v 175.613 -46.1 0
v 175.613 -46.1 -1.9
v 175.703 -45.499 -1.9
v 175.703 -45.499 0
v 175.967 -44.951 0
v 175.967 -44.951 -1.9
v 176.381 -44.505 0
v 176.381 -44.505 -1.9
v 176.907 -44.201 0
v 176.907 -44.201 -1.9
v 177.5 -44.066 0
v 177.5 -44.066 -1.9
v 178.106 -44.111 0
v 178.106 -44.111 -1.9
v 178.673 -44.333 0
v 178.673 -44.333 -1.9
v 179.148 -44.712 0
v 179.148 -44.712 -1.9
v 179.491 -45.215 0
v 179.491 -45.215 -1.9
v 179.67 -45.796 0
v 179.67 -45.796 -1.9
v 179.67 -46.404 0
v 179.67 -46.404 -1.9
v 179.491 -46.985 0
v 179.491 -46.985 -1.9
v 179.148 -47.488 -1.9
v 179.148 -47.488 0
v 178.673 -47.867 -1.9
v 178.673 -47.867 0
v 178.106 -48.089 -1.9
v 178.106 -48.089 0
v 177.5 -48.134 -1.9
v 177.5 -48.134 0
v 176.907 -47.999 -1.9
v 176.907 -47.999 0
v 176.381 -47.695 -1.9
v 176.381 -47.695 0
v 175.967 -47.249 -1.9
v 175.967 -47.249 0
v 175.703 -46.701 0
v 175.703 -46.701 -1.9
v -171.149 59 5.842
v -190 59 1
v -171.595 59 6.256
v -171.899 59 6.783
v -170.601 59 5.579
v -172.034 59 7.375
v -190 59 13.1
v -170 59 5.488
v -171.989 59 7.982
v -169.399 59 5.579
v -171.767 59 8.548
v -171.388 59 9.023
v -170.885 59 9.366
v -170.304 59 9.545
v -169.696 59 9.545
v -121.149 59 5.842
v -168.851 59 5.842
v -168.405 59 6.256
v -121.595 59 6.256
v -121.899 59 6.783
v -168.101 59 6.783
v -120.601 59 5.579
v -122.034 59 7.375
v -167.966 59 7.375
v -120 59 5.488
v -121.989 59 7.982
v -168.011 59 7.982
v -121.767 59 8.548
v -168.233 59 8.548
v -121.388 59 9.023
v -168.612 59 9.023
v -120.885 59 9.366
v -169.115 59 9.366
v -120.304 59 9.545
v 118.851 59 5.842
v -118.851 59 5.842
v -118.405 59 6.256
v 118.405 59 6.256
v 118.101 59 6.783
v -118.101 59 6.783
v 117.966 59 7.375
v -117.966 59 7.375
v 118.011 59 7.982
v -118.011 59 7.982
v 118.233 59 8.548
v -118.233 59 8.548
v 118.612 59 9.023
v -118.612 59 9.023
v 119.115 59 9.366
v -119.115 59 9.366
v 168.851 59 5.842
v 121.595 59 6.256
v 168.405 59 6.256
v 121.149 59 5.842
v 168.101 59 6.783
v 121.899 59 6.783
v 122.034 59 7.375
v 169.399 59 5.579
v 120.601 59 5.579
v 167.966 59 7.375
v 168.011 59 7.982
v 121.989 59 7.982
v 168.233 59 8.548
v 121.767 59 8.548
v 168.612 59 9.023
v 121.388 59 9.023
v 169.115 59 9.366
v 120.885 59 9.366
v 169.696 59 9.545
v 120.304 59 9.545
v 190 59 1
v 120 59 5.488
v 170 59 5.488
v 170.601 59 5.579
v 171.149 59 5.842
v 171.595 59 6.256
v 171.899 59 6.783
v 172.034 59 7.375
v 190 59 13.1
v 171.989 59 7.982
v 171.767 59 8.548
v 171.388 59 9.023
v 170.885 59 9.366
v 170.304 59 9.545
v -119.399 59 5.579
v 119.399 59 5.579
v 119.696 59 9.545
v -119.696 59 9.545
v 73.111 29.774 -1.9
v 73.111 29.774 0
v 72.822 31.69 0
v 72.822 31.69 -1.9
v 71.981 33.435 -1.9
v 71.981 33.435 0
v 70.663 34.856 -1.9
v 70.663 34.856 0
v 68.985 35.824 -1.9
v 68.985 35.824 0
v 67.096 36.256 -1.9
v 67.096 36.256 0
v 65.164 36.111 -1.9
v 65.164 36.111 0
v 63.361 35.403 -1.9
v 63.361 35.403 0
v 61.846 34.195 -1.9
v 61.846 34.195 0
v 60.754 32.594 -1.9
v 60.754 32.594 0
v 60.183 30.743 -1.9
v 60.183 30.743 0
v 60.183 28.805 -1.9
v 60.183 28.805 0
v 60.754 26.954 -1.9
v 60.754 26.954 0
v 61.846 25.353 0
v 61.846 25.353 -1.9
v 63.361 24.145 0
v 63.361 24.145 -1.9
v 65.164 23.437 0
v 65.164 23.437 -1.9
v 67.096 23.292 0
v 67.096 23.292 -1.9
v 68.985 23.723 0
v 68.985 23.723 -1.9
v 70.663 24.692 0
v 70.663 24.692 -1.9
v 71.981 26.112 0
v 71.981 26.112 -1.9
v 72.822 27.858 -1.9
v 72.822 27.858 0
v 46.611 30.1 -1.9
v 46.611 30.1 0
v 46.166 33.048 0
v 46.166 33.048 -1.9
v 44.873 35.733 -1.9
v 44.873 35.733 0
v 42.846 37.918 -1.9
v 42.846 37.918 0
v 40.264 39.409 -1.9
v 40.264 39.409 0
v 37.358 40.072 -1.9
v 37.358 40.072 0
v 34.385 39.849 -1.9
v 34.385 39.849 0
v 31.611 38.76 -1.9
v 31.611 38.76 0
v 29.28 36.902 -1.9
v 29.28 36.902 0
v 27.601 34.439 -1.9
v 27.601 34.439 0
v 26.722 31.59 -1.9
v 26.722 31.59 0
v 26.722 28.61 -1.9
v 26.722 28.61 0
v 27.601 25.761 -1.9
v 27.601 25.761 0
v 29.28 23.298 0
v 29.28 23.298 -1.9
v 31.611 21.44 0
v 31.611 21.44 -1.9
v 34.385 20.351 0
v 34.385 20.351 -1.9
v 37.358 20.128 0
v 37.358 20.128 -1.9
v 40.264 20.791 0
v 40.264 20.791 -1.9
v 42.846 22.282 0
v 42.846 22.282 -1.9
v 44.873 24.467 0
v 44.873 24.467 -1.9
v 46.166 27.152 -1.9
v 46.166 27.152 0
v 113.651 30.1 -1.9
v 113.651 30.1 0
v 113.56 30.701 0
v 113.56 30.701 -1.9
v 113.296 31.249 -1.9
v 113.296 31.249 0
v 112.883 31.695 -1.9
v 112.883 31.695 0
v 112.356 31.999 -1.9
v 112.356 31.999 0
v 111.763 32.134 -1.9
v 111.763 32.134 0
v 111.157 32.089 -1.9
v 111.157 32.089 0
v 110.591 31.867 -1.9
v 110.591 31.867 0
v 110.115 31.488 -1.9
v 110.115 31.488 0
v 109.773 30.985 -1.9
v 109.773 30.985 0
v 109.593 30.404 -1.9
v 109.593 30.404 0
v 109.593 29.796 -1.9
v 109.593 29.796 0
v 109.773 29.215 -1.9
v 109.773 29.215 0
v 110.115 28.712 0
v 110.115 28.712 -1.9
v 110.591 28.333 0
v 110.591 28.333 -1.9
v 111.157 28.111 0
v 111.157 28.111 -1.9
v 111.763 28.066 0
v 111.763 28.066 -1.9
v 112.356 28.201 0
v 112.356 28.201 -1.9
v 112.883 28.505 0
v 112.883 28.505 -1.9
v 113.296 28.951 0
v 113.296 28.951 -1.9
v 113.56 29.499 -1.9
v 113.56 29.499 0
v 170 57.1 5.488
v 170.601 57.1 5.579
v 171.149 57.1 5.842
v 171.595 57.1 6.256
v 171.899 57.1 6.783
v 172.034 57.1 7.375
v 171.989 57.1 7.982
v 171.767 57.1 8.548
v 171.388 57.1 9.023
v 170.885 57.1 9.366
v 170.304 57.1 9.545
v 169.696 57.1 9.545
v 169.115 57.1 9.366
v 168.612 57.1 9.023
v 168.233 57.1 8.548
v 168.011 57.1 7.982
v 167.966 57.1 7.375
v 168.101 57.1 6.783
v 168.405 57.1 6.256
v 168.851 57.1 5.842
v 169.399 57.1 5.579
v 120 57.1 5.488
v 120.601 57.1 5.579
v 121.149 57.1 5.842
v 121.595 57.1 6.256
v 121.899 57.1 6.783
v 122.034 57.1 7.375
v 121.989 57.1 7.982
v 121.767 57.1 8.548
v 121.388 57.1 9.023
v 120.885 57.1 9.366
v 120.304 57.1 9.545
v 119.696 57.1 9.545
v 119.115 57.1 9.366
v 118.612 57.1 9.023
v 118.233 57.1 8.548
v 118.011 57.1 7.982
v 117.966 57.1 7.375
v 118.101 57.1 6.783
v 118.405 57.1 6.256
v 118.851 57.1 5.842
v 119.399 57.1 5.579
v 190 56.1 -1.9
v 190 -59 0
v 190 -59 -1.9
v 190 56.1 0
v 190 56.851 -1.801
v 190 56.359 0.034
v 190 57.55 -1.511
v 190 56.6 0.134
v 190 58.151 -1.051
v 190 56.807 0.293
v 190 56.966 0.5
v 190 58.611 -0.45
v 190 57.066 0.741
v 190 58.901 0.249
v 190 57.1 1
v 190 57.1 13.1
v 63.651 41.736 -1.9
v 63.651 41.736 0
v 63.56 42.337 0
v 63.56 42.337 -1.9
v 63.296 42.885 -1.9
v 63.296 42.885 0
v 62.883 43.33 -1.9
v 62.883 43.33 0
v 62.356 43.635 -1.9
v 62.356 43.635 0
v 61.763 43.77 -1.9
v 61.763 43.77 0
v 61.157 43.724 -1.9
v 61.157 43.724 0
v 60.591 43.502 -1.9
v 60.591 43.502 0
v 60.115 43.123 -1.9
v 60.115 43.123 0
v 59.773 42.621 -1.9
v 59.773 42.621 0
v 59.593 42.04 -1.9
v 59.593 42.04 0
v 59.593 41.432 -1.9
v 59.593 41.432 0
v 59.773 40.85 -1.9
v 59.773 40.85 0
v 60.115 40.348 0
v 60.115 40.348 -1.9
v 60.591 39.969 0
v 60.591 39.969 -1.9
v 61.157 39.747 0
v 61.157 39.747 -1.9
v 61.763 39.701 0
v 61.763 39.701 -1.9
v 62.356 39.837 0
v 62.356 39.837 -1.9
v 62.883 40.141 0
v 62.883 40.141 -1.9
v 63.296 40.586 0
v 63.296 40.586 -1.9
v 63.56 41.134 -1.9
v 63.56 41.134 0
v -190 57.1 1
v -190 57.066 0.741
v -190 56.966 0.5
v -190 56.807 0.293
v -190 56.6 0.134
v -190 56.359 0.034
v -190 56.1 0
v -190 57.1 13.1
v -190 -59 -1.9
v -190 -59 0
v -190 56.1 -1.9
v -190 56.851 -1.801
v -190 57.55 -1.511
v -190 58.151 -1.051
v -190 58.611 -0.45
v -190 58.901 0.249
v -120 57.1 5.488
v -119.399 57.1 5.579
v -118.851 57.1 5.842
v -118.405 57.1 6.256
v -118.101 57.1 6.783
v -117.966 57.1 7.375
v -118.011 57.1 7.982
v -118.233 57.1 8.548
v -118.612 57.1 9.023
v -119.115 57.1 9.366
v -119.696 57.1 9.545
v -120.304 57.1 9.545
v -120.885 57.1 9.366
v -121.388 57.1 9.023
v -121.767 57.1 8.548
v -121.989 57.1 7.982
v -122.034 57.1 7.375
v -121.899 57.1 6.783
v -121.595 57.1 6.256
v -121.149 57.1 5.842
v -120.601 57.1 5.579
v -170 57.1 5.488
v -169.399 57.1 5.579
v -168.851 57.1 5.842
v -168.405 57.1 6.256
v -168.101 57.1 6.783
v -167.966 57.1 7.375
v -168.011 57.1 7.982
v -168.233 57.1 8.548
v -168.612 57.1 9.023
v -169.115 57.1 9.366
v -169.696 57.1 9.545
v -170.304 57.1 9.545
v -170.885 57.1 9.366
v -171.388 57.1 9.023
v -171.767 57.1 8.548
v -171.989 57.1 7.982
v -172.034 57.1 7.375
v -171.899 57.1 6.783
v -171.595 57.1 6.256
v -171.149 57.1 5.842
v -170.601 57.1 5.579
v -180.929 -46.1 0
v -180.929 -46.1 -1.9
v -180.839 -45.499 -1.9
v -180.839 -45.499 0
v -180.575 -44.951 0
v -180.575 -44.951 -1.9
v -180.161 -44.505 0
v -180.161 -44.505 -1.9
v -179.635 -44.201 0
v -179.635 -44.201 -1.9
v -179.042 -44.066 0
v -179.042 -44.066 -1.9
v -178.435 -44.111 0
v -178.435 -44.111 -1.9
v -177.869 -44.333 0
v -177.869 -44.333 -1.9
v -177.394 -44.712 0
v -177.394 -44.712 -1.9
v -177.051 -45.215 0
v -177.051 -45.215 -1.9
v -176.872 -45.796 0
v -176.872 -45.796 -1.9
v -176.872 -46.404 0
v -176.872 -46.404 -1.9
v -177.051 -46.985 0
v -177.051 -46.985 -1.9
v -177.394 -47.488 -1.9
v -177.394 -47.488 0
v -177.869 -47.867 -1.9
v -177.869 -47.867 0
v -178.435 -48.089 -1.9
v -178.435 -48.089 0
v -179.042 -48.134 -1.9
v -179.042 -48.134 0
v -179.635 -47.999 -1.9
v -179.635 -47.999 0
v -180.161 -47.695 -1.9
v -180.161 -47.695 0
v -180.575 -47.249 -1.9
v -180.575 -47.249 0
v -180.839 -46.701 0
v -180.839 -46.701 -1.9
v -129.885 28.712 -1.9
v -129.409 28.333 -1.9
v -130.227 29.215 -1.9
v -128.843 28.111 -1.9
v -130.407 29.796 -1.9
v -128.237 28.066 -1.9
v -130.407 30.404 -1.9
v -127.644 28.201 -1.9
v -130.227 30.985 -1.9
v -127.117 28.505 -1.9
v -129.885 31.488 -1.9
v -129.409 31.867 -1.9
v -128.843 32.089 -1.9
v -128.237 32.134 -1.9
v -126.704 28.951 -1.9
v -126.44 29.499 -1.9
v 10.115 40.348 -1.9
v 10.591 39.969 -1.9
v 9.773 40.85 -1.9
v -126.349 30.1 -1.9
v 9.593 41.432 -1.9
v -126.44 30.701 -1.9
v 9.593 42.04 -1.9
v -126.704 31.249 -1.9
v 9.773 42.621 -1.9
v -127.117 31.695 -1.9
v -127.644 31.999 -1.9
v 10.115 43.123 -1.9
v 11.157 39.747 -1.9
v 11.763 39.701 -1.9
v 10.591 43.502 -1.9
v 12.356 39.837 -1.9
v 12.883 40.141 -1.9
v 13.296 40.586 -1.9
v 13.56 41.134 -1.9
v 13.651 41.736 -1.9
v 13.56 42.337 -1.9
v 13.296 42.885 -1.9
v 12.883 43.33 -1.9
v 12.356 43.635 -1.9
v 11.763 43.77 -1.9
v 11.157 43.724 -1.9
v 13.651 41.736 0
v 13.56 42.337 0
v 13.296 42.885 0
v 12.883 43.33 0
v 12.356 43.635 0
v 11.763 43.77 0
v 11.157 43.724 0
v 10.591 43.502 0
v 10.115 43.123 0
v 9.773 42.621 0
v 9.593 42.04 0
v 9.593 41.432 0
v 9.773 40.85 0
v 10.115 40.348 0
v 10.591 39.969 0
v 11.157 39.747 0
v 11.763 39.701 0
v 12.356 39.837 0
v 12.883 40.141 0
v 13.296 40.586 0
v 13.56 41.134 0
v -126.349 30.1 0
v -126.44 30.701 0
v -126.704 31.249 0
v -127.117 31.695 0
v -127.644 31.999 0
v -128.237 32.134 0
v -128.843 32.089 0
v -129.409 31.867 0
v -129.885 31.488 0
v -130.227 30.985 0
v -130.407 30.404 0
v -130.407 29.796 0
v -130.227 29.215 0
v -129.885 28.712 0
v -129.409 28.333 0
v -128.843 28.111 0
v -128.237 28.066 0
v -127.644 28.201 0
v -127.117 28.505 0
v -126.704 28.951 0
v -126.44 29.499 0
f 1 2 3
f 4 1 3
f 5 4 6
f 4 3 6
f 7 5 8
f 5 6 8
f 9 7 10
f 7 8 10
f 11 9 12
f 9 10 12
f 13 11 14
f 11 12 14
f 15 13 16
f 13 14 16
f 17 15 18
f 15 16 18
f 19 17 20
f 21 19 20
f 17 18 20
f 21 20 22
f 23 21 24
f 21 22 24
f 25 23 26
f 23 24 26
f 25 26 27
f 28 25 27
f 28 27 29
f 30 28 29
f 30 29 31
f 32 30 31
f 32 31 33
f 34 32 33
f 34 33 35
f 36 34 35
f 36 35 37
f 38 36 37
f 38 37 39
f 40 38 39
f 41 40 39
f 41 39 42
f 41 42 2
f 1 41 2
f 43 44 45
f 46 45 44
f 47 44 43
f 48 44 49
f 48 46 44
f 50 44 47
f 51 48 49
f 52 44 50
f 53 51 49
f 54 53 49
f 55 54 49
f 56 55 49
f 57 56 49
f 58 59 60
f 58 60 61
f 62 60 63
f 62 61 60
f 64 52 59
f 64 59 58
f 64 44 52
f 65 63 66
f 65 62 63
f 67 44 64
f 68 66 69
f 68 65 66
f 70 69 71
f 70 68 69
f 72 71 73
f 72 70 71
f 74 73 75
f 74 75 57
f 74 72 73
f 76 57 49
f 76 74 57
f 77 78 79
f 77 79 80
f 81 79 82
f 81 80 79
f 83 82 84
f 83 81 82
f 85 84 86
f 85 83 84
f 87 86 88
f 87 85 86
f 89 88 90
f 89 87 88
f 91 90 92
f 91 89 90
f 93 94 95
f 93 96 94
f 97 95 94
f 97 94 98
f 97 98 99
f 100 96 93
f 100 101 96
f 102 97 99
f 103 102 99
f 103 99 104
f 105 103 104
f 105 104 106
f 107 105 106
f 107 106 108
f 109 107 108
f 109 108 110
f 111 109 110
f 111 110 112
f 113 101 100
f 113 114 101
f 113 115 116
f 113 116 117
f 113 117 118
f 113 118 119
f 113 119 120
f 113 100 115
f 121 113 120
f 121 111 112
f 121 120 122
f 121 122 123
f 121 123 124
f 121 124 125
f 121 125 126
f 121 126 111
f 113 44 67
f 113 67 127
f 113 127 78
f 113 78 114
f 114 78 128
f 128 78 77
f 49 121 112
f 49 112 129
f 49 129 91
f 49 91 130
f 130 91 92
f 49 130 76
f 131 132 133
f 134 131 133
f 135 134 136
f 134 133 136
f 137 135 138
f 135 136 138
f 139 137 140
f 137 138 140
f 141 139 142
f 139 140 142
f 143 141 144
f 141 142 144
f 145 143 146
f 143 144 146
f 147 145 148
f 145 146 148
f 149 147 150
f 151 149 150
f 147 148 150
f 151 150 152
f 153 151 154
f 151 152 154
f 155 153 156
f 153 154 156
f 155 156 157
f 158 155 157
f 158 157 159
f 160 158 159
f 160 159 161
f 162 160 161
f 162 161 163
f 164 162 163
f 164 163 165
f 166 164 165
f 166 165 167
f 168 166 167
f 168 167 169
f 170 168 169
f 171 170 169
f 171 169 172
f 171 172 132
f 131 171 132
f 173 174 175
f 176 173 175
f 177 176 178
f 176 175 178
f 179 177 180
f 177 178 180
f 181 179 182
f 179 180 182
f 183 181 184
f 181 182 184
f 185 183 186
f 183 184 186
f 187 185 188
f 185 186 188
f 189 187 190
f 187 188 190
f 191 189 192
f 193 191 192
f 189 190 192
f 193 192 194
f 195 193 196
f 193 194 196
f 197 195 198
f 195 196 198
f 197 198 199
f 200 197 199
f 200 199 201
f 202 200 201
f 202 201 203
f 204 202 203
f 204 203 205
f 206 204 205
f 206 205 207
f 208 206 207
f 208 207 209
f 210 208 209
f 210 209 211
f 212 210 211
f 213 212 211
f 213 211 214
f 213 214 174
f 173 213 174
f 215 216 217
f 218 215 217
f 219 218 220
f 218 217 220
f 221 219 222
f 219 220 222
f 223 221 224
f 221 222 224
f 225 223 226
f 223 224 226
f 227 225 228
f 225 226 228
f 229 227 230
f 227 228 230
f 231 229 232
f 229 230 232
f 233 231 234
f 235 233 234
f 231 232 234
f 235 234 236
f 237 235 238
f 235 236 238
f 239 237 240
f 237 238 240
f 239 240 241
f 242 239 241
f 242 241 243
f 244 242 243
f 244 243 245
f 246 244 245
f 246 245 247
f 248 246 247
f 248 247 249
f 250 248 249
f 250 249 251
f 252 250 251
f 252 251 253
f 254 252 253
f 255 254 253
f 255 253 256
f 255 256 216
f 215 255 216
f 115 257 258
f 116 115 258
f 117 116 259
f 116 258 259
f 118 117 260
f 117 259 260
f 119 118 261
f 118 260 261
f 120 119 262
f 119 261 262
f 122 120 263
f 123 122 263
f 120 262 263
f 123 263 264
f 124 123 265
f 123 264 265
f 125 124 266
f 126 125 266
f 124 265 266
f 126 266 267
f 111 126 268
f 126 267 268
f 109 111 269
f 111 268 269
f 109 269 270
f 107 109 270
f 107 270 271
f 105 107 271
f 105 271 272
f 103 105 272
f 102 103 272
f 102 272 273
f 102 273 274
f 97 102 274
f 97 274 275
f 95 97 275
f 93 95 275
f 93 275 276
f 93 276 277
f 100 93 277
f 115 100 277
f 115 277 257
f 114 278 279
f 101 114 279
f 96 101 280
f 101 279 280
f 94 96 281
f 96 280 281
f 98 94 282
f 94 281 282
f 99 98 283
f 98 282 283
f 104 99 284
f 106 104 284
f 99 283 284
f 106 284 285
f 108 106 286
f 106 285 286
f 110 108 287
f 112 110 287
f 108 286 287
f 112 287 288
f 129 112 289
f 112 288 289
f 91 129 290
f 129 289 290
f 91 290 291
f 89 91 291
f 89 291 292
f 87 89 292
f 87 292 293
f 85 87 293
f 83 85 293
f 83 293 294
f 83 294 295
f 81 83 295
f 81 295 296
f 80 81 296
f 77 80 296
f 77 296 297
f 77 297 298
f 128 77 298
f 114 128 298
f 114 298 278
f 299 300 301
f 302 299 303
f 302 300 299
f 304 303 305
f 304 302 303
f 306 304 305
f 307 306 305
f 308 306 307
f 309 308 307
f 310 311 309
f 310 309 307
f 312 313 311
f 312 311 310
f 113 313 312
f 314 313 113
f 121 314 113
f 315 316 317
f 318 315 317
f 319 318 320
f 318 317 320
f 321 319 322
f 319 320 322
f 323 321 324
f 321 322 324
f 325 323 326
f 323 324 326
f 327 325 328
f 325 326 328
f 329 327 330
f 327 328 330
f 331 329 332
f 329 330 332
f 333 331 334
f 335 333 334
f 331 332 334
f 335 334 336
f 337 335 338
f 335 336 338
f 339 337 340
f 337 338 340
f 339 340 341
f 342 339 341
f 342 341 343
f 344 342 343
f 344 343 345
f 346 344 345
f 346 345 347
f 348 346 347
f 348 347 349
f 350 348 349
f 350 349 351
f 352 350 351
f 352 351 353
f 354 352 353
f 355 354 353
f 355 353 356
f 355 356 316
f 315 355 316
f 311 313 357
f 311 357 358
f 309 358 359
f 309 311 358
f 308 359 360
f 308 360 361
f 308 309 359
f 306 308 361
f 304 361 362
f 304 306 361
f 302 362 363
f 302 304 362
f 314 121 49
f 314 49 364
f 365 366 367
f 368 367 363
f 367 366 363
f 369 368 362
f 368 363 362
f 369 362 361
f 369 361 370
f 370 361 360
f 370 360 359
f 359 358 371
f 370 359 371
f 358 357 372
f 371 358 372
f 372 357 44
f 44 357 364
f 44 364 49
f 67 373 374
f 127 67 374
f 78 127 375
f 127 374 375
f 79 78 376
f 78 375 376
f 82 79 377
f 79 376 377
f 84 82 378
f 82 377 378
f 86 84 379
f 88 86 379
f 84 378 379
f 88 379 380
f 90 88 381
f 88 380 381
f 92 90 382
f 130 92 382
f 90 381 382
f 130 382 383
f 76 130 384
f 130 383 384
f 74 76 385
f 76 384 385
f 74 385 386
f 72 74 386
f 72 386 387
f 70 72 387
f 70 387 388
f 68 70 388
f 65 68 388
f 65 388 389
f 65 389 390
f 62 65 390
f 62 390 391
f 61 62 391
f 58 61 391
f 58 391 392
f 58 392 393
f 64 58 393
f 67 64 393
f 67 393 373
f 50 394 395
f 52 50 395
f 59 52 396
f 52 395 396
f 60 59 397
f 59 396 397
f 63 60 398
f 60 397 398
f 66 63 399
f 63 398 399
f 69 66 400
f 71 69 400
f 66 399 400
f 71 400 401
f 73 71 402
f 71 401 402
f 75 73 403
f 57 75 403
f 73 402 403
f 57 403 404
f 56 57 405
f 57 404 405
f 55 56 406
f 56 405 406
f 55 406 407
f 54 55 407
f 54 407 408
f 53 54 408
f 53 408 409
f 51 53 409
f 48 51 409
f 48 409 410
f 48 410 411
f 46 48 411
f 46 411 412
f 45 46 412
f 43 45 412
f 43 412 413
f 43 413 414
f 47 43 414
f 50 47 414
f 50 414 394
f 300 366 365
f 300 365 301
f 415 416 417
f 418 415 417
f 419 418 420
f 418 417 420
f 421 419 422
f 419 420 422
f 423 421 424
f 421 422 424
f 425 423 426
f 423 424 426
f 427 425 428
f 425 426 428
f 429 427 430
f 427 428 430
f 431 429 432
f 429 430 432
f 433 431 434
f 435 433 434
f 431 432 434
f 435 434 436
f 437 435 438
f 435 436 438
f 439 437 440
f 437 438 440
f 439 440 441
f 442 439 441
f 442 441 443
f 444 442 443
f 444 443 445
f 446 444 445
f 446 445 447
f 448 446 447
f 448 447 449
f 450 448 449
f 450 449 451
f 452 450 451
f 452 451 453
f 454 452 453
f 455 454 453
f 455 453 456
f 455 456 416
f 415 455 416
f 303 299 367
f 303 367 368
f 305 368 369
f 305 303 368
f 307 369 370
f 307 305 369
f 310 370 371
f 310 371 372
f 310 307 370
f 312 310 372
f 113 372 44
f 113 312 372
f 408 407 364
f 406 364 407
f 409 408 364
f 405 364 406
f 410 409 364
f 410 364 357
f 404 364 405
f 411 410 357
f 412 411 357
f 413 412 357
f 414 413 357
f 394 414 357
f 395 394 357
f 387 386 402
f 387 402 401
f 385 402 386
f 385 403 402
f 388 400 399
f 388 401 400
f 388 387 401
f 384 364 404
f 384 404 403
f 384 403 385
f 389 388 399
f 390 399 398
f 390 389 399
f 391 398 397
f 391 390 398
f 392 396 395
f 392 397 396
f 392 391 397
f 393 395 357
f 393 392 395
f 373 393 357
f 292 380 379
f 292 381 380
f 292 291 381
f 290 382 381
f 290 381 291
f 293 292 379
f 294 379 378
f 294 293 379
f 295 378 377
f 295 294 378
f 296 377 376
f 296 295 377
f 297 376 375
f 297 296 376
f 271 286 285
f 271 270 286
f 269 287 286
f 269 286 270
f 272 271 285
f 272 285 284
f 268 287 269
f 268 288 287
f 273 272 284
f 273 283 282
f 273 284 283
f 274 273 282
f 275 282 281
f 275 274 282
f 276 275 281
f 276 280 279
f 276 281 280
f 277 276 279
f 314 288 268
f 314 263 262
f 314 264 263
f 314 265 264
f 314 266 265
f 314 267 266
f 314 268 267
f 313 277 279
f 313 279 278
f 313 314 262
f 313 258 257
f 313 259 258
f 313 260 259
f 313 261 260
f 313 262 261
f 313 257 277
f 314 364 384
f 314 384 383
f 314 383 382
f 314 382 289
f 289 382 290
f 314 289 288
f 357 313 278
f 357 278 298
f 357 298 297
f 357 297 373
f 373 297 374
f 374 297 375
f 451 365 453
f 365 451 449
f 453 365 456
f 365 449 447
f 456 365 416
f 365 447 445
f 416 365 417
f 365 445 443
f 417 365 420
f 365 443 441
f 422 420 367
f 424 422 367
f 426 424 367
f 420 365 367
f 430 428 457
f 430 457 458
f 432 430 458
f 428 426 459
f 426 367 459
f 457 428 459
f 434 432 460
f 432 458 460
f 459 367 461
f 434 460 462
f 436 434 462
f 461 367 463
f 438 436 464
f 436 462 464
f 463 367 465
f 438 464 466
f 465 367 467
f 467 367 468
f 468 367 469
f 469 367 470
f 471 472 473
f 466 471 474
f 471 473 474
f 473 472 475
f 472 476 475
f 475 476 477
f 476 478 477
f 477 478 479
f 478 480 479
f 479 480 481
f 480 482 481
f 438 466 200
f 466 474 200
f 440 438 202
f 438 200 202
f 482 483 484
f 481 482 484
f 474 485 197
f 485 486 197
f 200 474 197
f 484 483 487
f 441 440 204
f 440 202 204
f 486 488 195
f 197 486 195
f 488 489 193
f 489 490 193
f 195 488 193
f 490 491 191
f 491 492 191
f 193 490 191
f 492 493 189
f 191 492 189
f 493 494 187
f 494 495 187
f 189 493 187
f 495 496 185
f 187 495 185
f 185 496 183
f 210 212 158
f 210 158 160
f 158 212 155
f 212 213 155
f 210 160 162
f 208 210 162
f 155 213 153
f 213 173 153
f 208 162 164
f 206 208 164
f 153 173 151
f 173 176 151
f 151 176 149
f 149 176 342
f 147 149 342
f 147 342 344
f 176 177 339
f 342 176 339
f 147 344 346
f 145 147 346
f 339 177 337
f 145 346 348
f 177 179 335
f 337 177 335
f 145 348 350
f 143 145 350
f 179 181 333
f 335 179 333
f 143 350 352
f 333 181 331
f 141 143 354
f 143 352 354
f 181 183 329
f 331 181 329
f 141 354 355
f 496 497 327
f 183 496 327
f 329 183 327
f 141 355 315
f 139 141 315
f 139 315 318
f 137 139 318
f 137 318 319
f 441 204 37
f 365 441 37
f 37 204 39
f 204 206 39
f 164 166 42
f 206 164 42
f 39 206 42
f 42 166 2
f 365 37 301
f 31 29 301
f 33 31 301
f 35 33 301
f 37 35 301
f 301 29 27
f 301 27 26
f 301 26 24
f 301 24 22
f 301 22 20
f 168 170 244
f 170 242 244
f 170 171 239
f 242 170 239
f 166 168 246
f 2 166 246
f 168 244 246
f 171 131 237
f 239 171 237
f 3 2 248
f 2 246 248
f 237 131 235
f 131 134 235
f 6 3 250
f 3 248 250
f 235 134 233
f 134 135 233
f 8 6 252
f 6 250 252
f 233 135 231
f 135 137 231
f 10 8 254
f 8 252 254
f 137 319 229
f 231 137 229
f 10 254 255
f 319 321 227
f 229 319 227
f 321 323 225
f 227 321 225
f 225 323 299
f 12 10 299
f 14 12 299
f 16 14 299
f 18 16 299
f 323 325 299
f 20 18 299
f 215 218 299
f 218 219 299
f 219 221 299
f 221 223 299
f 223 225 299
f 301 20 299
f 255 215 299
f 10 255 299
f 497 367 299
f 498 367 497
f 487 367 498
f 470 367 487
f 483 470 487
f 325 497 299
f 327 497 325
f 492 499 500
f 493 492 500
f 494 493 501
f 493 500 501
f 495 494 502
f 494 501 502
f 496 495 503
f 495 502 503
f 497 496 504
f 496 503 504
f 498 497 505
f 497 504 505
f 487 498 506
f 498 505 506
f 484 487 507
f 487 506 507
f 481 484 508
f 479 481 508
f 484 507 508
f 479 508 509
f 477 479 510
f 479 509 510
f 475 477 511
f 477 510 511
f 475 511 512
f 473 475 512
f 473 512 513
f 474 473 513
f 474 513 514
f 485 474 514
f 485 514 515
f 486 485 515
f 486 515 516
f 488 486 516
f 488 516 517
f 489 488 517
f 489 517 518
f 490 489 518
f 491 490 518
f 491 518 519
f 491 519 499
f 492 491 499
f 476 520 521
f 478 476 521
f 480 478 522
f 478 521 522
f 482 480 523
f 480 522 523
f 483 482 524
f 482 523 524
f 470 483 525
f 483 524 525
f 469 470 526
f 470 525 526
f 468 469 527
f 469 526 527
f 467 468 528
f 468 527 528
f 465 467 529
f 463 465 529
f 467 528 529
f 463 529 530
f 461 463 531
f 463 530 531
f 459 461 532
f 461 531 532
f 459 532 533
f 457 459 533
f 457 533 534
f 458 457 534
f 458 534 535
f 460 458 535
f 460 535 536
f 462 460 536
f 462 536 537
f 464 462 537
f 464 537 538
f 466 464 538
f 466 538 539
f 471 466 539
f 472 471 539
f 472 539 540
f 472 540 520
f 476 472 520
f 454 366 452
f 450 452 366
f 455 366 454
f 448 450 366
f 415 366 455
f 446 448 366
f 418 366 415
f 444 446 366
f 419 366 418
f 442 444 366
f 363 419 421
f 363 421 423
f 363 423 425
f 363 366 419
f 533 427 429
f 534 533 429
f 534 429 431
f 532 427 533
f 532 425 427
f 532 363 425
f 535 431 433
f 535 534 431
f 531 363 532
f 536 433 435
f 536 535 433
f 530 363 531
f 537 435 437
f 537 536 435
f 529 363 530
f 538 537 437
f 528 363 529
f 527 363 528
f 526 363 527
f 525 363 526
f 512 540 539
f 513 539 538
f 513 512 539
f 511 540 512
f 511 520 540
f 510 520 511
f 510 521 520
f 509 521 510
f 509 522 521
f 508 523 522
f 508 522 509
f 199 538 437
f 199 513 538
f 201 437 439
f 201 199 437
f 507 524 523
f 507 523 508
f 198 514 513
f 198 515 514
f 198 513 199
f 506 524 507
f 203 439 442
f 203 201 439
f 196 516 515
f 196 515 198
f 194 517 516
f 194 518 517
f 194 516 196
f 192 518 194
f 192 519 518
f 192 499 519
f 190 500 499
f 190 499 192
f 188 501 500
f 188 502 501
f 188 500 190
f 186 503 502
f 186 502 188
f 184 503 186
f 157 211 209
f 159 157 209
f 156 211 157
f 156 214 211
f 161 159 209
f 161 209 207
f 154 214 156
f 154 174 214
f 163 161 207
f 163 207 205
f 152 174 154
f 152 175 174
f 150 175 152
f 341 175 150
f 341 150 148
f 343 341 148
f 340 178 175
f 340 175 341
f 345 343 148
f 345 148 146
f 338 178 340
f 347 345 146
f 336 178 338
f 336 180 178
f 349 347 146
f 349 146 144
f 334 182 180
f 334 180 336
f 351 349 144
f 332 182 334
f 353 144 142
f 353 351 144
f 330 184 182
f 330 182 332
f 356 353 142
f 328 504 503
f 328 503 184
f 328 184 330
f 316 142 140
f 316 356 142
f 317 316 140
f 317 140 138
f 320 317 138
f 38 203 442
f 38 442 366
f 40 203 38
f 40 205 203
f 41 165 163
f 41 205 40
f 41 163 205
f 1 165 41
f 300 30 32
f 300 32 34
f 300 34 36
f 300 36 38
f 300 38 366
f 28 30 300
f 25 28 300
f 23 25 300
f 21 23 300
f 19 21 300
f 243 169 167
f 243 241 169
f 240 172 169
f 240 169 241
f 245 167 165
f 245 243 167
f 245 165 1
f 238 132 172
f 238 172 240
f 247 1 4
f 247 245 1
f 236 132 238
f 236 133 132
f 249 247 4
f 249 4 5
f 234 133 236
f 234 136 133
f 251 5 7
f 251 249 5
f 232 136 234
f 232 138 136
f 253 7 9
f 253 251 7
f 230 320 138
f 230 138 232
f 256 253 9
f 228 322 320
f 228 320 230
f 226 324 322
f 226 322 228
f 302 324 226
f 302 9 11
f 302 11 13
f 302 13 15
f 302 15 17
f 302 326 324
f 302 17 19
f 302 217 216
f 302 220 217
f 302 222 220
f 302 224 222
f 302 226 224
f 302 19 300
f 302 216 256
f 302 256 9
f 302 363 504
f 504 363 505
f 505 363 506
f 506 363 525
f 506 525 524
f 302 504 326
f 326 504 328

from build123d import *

# Parameters (mm, degrees)
SKETCH1_W                    = 380
SKETCH1_H                    = 118
BASE_FLANGE1_DEPTH           = 1.9
EDGE_FLANGE1_STRIP_W         = 9.6
EDGE_FLANGE1_STRIP_H         = 1.9
EDGE_FLANGE1_STRIP_CUT_DEPTH = 380
EDGE_FLANGE1_DEPTH           = 380
SKETCH9_R                    = 10
SKETCH9_R_2                  = 2.04
CUT_EXTRUDE1_DEPTH           = 10
SKETCH10_R                   = 2.04
CUT_EXTRUDE2_DEPTH           = 10
SKETCH11_R                   = 2.04
CUT_EXTRUDE3_DEPTH           = 10
SKETCH12_R                   = 2.04
CUT_EXTRUDE4_DEPTH           = 10
SKETCH13_R                   = 6.5
CUT_EXTRUDE5_DEPTH           = 62


# Sheet-metal steps are written as plain solids
with BuildPart() as part:
    # Sketch1 → Base-Flange1 (new body)
    with BuildSketch(Plane.XY):
        Rectangle(SKETCH1_W, SKETCH1_H)
    extrude(amount=-BASE_FLANGE1_DEPTH)

    # Edge-Flange1 strip (across the edge) → Edge-Flange1 strip cut (cut)
    with BuildSketch(Plane(origin=(190, 59, 0), x_dir=(0, -1, 0), z_dir=(-1, 0, 0))):
        with Locations((-1.9, -0.95)):
            Rectangle(EDGE_FLANGE1_STRIP_W, EDGE_FLANGE1_STRIP_H)
    extrude(amount=EDGE_FLANGE1_STRIP_CUT_DEPTH, mode=Mode.SUBTRACT)

    # Edge-Flange1 section (across the edge) → Edge-Flange1 (add)
    with BuildSketch(Plane(origin=(190, 59, 0), x_dir=(0, -1, 0), z_dir=(-1, 0, 0))):
        with BuildLine():
            Line((0, 1), (0, 13.1))
            Line((0, 13.1), (1.9, 13.1))
            Line((1.9, 13.1), (1.9, 1))
            ThreePointArc((1.9, 1), (2.192893219, 0.292893219), (2.9, 0))
            Line((2.9, 0), (2.9, -1.9))
            ThreePointArc((2.9, -1.9), (0.849390335, -1.050609665), (0, 1))
        make_face()
    extrude(amount=EDGE_FLANGE1_DEPTH)

    # Sketch9 → Cut-Extrude1 (cut)
    with BuildSketch(Plane.XY):
        with Locations((36.610673768, 30.1)):
            Circle(SKETCH9_R)
        with Locations((-128.389326232, 30.1)):
            Circle(SKETCH9_R_2)
        with Locations((111.610673768, 30.1)):
            Circle(SKETCH9_R_2)
    extrude(amount=-CUT_EXTRUDE1_DEPTH, mode=Mode.SUBTRACT)

    # Sketch10 → Cut-Extrude2 (cut)
    with BuildSketch(Plane.XZ.offset(-57.1)):
        with Locations(Location((-170, 7.52794, 0), (0, 0, 270))):
            Circle(SKETCH10_R)
        with Locations(Location((-120, 7.52794, 0), (0, 0, 270))):
            Circle(SKETCH10_R)
        with Locations(Location((170, 7.52794, 0), (0, 0, 270))):
            Circle(SKETCH10_R)
        with Locations(Location((120, 7.52794, 0), (0, 0, 270))):
            Circle(SKETCH10_R)
    extrude(amount=-CUT_EXTRUDE2_DEPTH, mode=Mode.SUBTRACT)

    # Sketch11 → Cut-Extrude3 (cut)
    with BuildSketch(Plane(origin=(0, 0, -1.9), x_dir=(-1, 0, 0), z_dir=(0, 0, -1))):
        with Locations((178.889326232, -46.1)):
            Circle(SKETCH11_R)
        with Locations((-177.652523634, -46.1)):
            Circle(SKETCH11_R)
    extrude(amount=-CUT_EXTRUDE3_DEPTH, mode=Mode.SUBTRACT)

    # Sketch12 → Cut-Extrude4 (cut)
    with BuildSketch(Plane.XY):
        with Locations((11.610673768, 41.735559355)):
            Circle(SKETCH12_R)
        with Locations((61.610673768, 41.735559355)):
            Circle(SKETCH12_R)
    extrude(amount=-CUT_EXTRUDE4_DEPTH, mode=Mode.SUBTRACT)

    # Sketch13 → Cut-Extrude5 (cut)
    with BuildSketch(Plane.XY):
        with Locations((66.610673768, 29.7737606)):
            Circle(SKETCH13_R)
    extrude(amount=-CUT_EXTRUDE5_DEPTH, mode=Mode.SUBTRACT)


solid = part.part
